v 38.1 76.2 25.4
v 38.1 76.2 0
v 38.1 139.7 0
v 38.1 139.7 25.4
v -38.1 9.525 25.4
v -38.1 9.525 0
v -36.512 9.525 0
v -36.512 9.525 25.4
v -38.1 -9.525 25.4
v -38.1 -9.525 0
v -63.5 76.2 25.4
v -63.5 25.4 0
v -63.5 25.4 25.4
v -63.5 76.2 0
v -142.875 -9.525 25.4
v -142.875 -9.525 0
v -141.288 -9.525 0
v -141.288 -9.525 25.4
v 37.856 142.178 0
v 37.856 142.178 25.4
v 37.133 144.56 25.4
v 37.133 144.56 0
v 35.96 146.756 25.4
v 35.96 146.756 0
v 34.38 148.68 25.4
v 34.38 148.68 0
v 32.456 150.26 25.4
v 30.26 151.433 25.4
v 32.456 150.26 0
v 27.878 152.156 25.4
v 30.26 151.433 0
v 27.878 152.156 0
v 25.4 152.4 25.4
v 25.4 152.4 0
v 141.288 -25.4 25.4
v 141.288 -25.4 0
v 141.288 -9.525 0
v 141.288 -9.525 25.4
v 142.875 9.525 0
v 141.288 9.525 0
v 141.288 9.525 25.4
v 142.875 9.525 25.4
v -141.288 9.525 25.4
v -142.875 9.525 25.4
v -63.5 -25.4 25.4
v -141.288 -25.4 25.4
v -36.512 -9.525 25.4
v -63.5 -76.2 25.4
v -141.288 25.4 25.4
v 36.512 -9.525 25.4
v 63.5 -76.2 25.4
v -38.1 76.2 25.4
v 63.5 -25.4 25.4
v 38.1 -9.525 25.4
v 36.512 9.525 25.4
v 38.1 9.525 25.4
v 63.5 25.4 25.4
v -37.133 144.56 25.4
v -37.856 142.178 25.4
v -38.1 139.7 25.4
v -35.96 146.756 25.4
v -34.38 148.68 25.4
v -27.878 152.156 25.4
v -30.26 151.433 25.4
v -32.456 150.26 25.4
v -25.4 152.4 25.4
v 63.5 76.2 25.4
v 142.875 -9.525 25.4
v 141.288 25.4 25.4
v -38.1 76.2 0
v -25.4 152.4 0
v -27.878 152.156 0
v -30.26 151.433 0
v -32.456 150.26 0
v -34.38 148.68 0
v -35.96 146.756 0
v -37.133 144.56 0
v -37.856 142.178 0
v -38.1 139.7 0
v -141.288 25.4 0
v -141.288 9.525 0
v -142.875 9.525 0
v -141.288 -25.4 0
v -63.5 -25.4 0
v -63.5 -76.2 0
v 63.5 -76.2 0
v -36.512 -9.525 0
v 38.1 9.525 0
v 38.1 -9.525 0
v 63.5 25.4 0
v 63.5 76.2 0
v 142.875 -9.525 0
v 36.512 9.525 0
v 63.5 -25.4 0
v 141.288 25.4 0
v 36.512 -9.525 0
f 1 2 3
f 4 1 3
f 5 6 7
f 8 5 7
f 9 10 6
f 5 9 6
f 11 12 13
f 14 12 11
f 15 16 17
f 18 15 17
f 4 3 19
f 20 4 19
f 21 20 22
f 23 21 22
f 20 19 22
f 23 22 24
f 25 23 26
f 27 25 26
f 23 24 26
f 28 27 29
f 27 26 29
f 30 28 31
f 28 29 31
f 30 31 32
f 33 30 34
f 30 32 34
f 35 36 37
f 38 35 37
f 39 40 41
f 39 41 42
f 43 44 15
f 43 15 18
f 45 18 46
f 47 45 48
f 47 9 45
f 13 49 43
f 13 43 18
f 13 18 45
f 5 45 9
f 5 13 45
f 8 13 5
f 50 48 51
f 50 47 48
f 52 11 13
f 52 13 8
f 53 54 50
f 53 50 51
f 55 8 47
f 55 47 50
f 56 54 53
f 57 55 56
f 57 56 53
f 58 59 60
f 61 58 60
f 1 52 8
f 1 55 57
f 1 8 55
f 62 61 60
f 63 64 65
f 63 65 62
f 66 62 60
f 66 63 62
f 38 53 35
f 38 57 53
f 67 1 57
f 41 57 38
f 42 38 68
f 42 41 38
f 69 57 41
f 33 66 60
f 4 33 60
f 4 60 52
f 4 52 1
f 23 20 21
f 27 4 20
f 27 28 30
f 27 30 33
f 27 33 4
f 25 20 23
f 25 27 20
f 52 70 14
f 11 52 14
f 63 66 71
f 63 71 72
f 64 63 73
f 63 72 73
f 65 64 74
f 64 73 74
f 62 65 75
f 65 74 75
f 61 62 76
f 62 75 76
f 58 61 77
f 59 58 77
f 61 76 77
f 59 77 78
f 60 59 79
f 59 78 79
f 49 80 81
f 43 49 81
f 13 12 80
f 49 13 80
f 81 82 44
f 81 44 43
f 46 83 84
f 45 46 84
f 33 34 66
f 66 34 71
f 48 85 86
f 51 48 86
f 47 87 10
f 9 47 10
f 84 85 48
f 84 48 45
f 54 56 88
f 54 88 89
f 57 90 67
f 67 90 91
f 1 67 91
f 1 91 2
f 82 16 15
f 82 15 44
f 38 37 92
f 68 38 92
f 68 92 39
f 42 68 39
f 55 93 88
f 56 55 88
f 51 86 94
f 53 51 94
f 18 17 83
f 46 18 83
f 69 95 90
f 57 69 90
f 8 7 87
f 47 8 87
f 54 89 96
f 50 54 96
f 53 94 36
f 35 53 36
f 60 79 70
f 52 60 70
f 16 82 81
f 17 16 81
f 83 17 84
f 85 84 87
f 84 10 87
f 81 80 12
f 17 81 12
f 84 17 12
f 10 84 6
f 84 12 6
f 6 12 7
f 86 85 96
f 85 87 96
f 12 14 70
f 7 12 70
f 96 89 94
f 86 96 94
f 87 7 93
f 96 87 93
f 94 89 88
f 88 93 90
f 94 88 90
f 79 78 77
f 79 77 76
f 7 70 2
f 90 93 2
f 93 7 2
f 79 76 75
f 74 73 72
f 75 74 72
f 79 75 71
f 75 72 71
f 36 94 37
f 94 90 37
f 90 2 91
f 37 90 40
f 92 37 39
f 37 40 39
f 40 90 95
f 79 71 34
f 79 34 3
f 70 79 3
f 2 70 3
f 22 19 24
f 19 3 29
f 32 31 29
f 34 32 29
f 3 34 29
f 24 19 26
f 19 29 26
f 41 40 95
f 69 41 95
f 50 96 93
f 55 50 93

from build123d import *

# Parameters (mm, degrees)
F0_W     = 25.4
F0_H     = 50.8
F0_W_2   = 76.2
F0_W_3   = 1.5875
F0_H_2   = 19.05
F1_DEPTH = 25.4


with BuildPart() as f1:
    # F0 (on Top) → F1 (new body)
    with BuildSketch(Plane.XY):
        Polygon((63.5, 25.4), (38.1, 25.4), (38.1, 9.525), (38.1, -9.525), (38.1, -25.4), (63.5, -25.4), (88.9, -25.4), (88.9, 25.4), align=None)
        with Locations((50.8, 50.8)):
            Rectangle(F0_W, F0_H)
        with Locations((0, 50.8)):
            Rectangle(F0_W_2, F0_H)
        Polygon((-38.1, 9.525), (-38.1, 25.4), (-63.5, 25.4), (-88.9, 25.4), (-88.9, -25.4), (-63.5, -25.4), (-38.1, -25.4), (-38.1, -9.525), align=None)
        with Locations((-50.8, 50.8)):
            Rectangle(F0_W, F0_H)
        with Locations((0, 101.6)):
            Rectangle(F0_W_2, F0_H)
        with Locations((89.69375, 0)):
            Rectangle(F0_W_3, F0_H)
        with BuildLine():
            Line((-38.1, 127), (38.1, 127))
            Line((38.1, 127), (38.1, 139.7))
            ThreePointArc((38.1, 139.7), (34.3802561211, 148.6802561211), (25.4, 152.4))
            Line((25.4, 152.4), (-25.4, 152.4))
            ThreePointArc((-25.4, 152.4), (-34.3802561211, 148.6802561211), (-38.1, 139.7))
            Line((-38.1, 139.7), (-38.1, 127))
        make_face()
        with Locations((-89.69375, 0)):
            Rectangle(F0_W_3, F0_H)
        with Locations((0, -50.8)):
            Rectangle(F0_W_2, F0_H)
        with Locations((50.8, -50.8)):
            Rectangle(F0_W, F0_H)
        Polygon((141.2875, 25.4), (90.4875, 25.4), (90.4875, -25.4), (141.2875, -25.4), (141.2875, -9.525), (141.2875, 9.525), align=None)
        with Locations((-50.8, -50.8)):
            Rectangle(F0_W, F0_H)
        Polygon((-90.4875, -25.4), (-90.4875, 25.4), (-141.2875, 25.4), (-141.2875, 9.525), (-141.2875, -9.525), (-141.2875, -25.4), align=None)
        with Locations((142.08125, 0)):
            Rectangle(F0_W_3, F0_H_2)
        with Locations((-142.08125, 0)):
            Rectangle(F0_W_3, F0_H_2)
        Polygon((38.1, 9.525), (38.1, 25.4), (-38.1, 25.4), (-38.1, 9.525), (-36.5125, 9.525), (-36.5125, -9.525), (-38.1, -9.525), (-38.1, -25.4), (38.1, -25.4), (38.1, -9.525), (36.5125, -9.525), (36.5125, 9.525), align=None)
    extrude(amount=F1_DEPTH)


solid = f1.part
